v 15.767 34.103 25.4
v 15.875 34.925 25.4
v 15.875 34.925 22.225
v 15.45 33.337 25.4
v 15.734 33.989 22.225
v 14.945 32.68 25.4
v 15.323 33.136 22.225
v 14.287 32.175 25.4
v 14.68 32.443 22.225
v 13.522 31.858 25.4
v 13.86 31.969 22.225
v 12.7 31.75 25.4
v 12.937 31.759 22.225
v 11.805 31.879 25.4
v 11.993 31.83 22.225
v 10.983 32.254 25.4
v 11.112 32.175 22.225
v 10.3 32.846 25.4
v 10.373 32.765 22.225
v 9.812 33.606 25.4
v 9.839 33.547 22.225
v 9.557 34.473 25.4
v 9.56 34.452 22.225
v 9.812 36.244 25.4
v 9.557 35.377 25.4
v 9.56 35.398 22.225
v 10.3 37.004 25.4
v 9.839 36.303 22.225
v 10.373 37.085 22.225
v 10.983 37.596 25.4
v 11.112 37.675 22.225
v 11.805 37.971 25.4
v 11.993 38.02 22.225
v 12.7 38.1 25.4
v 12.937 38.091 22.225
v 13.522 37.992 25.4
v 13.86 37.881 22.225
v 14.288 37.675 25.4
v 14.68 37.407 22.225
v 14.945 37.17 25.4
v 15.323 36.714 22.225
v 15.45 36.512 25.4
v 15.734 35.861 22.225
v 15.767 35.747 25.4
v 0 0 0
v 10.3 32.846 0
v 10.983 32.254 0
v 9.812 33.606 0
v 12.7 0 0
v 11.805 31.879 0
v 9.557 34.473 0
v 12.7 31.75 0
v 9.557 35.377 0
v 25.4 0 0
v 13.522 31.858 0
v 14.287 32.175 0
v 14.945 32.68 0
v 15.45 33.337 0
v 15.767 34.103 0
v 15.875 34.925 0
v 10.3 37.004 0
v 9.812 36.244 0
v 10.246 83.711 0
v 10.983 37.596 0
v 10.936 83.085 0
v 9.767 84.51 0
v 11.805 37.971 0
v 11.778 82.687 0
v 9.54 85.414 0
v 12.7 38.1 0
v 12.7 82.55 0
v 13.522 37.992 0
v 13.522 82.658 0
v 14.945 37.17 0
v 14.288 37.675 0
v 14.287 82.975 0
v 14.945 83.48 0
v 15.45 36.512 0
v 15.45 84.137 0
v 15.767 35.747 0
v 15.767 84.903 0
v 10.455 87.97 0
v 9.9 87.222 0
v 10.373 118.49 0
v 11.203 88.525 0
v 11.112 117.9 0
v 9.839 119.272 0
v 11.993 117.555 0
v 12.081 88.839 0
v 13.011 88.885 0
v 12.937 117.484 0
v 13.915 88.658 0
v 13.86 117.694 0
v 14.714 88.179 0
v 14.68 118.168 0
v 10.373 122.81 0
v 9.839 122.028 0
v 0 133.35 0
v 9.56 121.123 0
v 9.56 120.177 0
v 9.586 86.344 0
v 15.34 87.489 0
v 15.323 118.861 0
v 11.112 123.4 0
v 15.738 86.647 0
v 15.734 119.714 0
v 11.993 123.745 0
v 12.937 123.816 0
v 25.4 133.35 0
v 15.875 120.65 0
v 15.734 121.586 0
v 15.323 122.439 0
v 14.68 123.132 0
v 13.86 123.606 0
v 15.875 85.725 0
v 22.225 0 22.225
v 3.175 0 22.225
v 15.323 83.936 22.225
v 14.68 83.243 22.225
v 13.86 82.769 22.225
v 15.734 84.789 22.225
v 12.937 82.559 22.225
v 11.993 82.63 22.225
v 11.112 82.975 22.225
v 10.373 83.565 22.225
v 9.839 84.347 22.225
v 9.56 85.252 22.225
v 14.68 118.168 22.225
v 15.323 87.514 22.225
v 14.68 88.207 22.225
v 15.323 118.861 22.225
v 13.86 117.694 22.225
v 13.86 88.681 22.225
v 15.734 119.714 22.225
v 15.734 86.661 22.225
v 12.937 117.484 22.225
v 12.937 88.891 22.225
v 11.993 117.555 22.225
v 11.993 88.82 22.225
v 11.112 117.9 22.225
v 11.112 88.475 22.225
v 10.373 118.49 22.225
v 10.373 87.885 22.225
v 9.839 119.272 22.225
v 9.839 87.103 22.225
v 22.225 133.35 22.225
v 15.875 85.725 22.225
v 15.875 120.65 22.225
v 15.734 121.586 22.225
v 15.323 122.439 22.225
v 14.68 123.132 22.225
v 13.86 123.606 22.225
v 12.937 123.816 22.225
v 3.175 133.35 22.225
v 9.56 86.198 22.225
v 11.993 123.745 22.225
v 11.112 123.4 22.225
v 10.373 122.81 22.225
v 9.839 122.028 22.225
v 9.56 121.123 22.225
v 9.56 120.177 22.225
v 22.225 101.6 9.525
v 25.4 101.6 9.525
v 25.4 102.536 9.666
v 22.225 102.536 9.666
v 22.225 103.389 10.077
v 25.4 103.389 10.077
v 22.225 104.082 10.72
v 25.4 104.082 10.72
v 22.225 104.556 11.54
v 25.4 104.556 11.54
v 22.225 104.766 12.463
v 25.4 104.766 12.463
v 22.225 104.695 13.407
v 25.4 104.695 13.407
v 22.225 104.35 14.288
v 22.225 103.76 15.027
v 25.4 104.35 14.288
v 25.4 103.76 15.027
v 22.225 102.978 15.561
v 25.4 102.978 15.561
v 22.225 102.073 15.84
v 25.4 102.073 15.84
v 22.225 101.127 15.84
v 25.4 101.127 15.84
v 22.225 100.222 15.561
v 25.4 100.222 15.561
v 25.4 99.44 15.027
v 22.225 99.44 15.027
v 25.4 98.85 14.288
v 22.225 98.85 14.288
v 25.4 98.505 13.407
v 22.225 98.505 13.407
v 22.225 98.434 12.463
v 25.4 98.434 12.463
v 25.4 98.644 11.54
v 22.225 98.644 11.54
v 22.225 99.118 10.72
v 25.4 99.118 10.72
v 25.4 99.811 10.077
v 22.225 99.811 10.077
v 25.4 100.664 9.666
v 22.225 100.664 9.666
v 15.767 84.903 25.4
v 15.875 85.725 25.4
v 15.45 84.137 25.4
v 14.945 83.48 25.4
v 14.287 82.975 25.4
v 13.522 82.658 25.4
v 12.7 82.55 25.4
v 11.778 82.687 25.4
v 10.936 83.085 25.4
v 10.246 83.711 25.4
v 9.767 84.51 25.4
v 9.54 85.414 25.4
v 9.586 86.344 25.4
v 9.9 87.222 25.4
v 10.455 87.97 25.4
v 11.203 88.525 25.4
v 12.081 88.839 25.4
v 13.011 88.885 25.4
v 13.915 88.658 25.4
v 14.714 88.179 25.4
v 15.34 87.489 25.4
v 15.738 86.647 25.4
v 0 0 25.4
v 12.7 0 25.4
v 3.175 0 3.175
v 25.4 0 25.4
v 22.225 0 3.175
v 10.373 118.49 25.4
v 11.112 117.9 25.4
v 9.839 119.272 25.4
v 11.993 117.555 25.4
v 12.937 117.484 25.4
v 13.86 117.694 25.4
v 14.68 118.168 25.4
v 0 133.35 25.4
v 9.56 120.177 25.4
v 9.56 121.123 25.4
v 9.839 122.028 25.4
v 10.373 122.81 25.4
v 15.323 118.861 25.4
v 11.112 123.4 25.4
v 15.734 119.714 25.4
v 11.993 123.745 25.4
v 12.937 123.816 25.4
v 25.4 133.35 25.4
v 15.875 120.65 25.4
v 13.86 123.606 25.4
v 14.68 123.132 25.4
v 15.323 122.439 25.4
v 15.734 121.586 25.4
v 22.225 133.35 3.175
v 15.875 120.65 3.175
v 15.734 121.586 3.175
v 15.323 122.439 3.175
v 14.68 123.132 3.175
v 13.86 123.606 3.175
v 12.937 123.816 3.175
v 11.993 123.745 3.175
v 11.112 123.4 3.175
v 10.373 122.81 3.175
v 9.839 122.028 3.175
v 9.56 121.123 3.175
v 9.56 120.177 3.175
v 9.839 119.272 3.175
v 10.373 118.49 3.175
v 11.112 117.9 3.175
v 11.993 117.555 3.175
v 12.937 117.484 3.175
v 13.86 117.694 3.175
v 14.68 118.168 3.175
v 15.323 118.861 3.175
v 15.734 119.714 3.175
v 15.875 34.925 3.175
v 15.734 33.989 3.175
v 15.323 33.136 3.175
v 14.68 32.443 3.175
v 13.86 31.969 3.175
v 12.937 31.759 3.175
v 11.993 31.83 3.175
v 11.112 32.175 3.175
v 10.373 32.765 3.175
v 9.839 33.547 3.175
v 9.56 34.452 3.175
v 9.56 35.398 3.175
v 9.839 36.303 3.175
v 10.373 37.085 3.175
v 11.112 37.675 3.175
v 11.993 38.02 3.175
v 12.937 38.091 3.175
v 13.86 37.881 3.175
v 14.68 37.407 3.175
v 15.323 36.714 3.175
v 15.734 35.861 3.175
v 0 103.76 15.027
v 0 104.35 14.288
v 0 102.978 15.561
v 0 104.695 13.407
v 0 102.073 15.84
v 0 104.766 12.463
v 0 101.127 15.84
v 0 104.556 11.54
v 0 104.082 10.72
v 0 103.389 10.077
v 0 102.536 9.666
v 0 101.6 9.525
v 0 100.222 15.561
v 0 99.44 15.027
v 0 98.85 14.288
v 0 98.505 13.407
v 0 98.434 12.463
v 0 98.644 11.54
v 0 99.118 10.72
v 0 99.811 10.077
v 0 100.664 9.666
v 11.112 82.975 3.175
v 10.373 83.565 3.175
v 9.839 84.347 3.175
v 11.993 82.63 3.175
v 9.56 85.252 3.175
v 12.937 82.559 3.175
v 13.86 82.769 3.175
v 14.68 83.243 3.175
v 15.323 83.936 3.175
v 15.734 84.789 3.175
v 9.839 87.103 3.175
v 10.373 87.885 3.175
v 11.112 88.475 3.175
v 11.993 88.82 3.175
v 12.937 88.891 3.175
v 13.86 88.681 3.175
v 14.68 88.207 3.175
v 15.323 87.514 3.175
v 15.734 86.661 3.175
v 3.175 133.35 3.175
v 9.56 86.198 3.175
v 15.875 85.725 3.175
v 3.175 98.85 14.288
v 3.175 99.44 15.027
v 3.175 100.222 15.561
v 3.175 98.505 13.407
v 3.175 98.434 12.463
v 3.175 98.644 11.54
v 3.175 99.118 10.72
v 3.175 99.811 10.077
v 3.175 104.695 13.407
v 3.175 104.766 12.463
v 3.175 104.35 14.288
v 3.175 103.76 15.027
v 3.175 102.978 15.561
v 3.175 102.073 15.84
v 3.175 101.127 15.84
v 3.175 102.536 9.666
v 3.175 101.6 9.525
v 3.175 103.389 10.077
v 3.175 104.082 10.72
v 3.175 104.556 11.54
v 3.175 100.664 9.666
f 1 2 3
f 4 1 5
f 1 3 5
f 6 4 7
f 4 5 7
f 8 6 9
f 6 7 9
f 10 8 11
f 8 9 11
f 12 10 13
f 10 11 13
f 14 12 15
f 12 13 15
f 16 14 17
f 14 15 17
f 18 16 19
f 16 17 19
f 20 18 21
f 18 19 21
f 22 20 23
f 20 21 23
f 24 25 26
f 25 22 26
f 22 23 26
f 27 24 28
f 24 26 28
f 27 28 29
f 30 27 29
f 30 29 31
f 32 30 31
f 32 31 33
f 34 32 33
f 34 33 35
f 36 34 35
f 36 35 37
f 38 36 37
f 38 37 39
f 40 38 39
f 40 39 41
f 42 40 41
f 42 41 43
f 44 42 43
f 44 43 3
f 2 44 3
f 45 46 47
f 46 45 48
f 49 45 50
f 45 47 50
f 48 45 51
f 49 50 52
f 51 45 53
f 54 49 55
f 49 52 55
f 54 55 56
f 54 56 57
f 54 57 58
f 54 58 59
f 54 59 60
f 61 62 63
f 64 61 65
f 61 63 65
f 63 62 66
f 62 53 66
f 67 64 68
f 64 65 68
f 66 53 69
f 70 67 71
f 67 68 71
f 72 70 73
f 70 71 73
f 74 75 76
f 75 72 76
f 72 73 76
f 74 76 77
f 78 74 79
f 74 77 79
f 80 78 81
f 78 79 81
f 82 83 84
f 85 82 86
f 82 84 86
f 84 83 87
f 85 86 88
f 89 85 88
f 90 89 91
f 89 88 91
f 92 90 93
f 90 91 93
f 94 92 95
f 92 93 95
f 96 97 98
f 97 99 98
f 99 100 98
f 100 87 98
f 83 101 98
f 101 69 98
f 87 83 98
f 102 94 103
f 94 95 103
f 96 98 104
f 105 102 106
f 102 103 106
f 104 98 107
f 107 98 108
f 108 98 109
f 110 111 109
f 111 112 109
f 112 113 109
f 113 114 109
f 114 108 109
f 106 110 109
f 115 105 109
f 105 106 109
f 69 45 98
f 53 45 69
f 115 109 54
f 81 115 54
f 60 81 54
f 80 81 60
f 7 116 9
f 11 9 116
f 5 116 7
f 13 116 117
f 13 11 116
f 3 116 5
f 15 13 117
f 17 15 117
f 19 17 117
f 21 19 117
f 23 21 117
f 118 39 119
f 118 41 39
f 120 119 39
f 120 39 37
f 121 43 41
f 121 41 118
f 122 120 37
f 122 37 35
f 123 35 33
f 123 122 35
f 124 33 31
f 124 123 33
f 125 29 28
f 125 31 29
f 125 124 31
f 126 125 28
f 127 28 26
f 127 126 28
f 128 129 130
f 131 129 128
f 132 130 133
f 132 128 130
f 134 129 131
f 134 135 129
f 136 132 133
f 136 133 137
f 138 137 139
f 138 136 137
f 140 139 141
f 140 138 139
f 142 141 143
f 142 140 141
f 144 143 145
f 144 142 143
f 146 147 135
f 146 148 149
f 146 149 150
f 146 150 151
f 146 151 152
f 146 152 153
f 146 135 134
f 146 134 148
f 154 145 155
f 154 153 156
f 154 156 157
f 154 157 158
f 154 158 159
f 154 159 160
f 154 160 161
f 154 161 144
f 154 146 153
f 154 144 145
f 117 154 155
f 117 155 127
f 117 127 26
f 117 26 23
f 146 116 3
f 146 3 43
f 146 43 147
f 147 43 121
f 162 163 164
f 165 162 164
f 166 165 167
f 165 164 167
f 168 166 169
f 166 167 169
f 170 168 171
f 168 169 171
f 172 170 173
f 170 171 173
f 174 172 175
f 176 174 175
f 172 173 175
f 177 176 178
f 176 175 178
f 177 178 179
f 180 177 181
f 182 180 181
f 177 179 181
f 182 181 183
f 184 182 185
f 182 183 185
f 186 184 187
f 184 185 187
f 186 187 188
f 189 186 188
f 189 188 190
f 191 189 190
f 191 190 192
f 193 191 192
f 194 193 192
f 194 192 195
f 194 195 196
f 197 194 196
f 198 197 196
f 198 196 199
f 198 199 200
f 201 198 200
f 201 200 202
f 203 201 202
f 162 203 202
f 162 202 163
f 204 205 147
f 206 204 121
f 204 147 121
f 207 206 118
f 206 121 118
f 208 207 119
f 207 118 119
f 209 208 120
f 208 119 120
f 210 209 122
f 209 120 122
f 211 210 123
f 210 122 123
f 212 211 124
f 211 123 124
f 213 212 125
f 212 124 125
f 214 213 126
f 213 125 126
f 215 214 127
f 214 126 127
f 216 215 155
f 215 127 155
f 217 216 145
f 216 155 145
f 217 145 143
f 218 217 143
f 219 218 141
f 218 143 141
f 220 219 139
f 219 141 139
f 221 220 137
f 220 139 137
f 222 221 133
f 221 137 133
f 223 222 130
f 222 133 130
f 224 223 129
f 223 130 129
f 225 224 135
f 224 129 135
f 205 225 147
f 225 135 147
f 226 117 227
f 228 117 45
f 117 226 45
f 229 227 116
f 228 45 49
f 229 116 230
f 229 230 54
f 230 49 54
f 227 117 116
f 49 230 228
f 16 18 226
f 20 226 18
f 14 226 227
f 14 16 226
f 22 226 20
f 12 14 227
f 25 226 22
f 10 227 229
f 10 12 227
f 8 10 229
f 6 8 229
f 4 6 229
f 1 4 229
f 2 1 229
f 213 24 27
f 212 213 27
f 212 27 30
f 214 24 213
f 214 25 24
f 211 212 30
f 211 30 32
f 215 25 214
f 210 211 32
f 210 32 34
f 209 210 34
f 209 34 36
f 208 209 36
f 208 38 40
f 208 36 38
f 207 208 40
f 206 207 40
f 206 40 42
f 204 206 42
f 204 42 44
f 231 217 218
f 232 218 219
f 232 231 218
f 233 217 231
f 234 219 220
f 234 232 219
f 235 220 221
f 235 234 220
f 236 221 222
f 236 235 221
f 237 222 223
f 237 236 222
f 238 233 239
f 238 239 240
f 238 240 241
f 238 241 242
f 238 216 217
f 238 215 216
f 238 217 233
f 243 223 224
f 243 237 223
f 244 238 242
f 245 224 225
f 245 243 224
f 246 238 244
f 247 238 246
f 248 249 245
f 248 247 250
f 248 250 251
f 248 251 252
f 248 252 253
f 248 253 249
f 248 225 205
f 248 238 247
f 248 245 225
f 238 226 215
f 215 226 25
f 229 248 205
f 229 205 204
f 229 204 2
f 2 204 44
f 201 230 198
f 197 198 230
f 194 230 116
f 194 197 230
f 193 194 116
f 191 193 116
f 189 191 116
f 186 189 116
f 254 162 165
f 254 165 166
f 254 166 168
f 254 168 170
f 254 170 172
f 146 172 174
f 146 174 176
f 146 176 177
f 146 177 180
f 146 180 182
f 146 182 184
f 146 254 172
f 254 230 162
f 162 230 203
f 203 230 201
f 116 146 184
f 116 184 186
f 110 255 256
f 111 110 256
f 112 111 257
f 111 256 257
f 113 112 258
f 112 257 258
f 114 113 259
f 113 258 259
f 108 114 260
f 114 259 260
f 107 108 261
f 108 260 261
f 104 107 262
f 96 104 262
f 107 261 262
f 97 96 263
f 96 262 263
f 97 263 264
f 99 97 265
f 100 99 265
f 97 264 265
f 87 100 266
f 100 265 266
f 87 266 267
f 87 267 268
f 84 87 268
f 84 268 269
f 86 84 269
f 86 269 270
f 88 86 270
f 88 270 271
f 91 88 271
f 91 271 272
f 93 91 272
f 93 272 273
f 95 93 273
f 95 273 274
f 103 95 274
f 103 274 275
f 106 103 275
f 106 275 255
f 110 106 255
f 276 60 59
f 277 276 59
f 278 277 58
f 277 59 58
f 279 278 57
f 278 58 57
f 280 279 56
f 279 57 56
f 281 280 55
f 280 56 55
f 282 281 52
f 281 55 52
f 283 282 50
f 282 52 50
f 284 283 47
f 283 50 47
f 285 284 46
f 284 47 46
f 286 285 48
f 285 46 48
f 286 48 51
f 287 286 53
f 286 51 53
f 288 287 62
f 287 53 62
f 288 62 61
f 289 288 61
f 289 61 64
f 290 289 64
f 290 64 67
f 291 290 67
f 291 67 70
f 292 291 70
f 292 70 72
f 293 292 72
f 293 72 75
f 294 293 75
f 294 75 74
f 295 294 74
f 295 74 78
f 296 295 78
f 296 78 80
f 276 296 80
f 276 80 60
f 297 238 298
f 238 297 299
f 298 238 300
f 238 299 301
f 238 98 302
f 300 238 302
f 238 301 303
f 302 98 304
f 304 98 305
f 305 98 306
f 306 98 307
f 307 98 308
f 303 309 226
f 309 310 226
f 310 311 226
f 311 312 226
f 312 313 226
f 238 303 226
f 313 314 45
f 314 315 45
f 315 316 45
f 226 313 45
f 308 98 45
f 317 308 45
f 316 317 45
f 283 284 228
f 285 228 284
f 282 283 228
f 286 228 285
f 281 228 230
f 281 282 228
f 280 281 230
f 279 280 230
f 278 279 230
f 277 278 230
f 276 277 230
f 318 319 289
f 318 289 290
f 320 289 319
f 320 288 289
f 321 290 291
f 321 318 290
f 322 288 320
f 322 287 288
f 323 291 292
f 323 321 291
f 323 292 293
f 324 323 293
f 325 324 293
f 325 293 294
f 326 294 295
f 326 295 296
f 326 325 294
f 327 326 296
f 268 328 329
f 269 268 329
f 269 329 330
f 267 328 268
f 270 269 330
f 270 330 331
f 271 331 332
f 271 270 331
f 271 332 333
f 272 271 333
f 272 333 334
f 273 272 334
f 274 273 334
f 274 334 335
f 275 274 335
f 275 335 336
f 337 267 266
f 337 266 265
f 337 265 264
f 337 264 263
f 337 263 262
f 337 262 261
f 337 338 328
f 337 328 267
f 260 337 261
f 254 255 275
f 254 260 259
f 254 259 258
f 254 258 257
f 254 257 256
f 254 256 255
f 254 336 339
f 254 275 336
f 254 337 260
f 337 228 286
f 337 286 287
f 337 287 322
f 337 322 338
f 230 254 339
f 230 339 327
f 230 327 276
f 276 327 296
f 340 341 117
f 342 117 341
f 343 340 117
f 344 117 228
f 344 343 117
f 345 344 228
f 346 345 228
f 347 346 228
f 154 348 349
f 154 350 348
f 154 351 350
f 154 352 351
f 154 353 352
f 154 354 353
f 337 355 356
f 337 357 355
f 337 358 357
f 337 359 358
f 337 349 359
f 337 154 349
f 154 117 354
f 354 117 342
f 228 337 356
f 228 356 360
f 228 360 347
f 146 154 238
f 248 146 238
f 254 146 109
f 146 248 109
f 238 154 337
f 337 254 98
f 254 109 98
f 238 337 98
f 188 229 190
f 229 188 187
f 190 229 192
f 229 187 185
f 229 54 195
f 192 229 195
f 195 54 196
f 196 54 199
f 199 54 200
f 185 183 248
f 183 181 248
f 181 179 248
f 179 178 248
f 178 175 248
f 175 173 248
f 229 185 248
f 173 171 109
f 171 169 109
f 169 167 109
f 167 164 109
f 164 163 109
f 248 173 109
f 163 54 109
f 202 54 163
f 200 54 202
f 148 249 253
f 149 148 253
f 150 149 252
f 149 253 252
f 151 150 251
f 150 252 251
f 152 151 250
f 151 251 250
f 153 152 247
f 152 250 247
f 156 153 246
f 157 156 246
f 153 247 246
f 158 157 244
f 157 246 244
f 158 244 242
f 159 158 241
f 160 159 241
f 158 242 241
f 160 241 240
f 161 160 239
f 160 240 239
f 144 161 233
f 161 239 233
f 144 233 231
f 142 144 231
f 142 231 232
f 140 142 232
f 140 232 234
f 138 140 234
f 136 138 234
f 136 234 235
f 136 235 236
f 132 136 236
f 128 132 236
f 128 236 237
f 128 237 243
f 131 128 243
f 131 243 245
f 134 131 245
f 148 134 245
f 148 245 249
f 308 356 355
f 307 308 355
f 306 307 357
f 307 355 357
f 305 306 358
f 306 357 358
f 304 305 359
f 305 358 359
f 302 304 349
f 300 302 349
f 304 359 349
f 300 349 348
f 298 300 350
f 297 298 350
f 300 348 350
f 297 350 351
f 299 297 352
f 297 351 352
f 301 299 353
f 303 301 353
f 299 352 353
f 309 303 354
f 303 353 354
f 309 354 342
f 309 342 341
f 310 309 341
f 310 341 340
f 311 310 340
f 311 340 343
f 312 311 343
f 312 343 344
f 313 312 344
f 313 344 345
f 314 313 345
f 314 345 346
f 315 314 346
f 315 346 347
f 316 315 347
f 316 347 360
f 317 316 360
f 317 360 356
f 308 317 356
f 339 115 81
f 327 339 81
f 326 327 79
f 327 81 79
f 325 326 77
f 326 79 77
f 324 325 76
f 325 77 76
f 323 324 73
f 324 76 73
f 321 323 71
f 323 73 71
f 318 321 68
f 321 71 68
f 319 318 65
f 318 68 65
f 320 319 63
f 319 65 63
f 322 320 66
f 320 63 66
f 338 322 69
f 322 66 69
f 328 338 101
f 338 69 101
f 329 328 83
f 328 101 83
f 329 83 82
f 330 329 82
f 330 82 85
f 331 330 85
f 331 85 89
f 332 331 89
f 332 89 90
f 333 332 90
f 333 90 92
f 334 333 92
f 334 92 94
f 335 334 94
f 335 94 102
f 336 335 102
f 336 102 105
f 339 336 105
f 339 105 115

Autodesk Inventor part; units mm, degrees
ref_plane "YZ Plane" through (0, 0, 0) normal (1, 0, 0) x (0, 1, 0)
ref_plane "XZ Plane" through (0, 0, 0) normal (0, 1, 0) x (-1, 0, 0)
ref_plane "XY Plane" through (0, 0, 0) normal (0, 0, 1) x (1, 0, 0)
sketch "Sketch1" plane through (0, 0, 0) normal (0, 0, 1) x (1, 0, 0)
  line L0 (0, 0) -> (25.4, 0)
  line L1 (25.4, 0) -> (25.4, 133.35)
  line L2 (25.4, 133.35) -> (0, 133.35)
  line L3 (0, 133.35) -> (0, 0)
  line L4 (25.4, 0) -> (0, 0)
  line L5 (0, 0) -> (0, 92.075)
  line L6 (0, 92.075) -> (25.4, 92.075)
  line L7 (25.4, 92.075) -> (25.4, 0)
  line L8 (12.7, 0) -> (12.7, 85.725)
  line L9 (12.7, 0) -> (98.425, 0) construction
  circle A0 centre (12.7, 85.725) radius 3.175
  line L10 (12.7, 85.725) -> (12.7, 34.925)
  circle A1 centre (12.7, 34.925) radius 3.175
  dimension "d0" = 25.4
  dimension "d1" = 133.35
  dimension "d2" = 25.4
  dimension "d3" = 92.075
  dimension "d4" = 85.725
  dimension "d5" = 90
  dimension "d6" = 6.35
  dimension "d7" = 50.8
  dimension "d8" = 6.35
extrude "Extrusion1" add sketch "Sketch1" along normal blind 25.4
sketch "Sketch2" plane through (0, 133.35, 0) normal (0, 1, 0) x (1, 0, 0)
  line L0 (22.225, -22.225) -> (3.175, -22.225)
  line L1 (3.175, -22.225) -> (3.175, -3.175)
  line L2 (3.175, -3.175) -> (22.225, -3.175)
  line L3 (22.225, -3.175) -> (22.225, -22.225)
  dimension "d11" = 19.05
  dimension "d12" = 19.05
extrude "Extrusion2" cut sketch "Sketch2" against normal blind 254
sketch "Sketch3" plane through (25.4, 0, 0) normal (1, 0, 0) x (0, 0, -1)
  line L0 (0, 133.35) -> (-25.4, 133.35) projected
  line L1 (0, 0) -> (-25.4, 0) projected
  line L2 (-12.7, 133.35) -> (-12.7, 101.6)
  line L3 (-12.7, 133.35) -> (19.05, 133.35) construction
  circle A0 centre (-12.7, 101.6) radius 3.175
  dimension "d15" = 31.75
  dimension "d16" = 90
  dimension "d17" = 6.35
extrude "Extrusion3" cut sketch "Sketch3" against normal blind 254
sketch "Sketch4" plane through (0, 0, 25.4) normal (0, 0, 1) x (1, 0, 0)
  line L0 (25.4, 133.35) -> (0, 133.35) projected
  line L1 (0, 133.35) -> (0, 0) projected
  line L2 (12.7, 133.35) -> (12.7, 120.65)
  line L3 (12.7, 133.35) -> (25.4, 133.35) construction
  circle A0 centre (12.7, 120.65) radius 3.175
  dimension "d20" = 12.7
  dimension "d21" = 90
  dimension "d22" = 6.35
extrude "Extrusion4" cut sketch "Sketch4" against normal blind 25.4
properties part number "CatchSupport"
